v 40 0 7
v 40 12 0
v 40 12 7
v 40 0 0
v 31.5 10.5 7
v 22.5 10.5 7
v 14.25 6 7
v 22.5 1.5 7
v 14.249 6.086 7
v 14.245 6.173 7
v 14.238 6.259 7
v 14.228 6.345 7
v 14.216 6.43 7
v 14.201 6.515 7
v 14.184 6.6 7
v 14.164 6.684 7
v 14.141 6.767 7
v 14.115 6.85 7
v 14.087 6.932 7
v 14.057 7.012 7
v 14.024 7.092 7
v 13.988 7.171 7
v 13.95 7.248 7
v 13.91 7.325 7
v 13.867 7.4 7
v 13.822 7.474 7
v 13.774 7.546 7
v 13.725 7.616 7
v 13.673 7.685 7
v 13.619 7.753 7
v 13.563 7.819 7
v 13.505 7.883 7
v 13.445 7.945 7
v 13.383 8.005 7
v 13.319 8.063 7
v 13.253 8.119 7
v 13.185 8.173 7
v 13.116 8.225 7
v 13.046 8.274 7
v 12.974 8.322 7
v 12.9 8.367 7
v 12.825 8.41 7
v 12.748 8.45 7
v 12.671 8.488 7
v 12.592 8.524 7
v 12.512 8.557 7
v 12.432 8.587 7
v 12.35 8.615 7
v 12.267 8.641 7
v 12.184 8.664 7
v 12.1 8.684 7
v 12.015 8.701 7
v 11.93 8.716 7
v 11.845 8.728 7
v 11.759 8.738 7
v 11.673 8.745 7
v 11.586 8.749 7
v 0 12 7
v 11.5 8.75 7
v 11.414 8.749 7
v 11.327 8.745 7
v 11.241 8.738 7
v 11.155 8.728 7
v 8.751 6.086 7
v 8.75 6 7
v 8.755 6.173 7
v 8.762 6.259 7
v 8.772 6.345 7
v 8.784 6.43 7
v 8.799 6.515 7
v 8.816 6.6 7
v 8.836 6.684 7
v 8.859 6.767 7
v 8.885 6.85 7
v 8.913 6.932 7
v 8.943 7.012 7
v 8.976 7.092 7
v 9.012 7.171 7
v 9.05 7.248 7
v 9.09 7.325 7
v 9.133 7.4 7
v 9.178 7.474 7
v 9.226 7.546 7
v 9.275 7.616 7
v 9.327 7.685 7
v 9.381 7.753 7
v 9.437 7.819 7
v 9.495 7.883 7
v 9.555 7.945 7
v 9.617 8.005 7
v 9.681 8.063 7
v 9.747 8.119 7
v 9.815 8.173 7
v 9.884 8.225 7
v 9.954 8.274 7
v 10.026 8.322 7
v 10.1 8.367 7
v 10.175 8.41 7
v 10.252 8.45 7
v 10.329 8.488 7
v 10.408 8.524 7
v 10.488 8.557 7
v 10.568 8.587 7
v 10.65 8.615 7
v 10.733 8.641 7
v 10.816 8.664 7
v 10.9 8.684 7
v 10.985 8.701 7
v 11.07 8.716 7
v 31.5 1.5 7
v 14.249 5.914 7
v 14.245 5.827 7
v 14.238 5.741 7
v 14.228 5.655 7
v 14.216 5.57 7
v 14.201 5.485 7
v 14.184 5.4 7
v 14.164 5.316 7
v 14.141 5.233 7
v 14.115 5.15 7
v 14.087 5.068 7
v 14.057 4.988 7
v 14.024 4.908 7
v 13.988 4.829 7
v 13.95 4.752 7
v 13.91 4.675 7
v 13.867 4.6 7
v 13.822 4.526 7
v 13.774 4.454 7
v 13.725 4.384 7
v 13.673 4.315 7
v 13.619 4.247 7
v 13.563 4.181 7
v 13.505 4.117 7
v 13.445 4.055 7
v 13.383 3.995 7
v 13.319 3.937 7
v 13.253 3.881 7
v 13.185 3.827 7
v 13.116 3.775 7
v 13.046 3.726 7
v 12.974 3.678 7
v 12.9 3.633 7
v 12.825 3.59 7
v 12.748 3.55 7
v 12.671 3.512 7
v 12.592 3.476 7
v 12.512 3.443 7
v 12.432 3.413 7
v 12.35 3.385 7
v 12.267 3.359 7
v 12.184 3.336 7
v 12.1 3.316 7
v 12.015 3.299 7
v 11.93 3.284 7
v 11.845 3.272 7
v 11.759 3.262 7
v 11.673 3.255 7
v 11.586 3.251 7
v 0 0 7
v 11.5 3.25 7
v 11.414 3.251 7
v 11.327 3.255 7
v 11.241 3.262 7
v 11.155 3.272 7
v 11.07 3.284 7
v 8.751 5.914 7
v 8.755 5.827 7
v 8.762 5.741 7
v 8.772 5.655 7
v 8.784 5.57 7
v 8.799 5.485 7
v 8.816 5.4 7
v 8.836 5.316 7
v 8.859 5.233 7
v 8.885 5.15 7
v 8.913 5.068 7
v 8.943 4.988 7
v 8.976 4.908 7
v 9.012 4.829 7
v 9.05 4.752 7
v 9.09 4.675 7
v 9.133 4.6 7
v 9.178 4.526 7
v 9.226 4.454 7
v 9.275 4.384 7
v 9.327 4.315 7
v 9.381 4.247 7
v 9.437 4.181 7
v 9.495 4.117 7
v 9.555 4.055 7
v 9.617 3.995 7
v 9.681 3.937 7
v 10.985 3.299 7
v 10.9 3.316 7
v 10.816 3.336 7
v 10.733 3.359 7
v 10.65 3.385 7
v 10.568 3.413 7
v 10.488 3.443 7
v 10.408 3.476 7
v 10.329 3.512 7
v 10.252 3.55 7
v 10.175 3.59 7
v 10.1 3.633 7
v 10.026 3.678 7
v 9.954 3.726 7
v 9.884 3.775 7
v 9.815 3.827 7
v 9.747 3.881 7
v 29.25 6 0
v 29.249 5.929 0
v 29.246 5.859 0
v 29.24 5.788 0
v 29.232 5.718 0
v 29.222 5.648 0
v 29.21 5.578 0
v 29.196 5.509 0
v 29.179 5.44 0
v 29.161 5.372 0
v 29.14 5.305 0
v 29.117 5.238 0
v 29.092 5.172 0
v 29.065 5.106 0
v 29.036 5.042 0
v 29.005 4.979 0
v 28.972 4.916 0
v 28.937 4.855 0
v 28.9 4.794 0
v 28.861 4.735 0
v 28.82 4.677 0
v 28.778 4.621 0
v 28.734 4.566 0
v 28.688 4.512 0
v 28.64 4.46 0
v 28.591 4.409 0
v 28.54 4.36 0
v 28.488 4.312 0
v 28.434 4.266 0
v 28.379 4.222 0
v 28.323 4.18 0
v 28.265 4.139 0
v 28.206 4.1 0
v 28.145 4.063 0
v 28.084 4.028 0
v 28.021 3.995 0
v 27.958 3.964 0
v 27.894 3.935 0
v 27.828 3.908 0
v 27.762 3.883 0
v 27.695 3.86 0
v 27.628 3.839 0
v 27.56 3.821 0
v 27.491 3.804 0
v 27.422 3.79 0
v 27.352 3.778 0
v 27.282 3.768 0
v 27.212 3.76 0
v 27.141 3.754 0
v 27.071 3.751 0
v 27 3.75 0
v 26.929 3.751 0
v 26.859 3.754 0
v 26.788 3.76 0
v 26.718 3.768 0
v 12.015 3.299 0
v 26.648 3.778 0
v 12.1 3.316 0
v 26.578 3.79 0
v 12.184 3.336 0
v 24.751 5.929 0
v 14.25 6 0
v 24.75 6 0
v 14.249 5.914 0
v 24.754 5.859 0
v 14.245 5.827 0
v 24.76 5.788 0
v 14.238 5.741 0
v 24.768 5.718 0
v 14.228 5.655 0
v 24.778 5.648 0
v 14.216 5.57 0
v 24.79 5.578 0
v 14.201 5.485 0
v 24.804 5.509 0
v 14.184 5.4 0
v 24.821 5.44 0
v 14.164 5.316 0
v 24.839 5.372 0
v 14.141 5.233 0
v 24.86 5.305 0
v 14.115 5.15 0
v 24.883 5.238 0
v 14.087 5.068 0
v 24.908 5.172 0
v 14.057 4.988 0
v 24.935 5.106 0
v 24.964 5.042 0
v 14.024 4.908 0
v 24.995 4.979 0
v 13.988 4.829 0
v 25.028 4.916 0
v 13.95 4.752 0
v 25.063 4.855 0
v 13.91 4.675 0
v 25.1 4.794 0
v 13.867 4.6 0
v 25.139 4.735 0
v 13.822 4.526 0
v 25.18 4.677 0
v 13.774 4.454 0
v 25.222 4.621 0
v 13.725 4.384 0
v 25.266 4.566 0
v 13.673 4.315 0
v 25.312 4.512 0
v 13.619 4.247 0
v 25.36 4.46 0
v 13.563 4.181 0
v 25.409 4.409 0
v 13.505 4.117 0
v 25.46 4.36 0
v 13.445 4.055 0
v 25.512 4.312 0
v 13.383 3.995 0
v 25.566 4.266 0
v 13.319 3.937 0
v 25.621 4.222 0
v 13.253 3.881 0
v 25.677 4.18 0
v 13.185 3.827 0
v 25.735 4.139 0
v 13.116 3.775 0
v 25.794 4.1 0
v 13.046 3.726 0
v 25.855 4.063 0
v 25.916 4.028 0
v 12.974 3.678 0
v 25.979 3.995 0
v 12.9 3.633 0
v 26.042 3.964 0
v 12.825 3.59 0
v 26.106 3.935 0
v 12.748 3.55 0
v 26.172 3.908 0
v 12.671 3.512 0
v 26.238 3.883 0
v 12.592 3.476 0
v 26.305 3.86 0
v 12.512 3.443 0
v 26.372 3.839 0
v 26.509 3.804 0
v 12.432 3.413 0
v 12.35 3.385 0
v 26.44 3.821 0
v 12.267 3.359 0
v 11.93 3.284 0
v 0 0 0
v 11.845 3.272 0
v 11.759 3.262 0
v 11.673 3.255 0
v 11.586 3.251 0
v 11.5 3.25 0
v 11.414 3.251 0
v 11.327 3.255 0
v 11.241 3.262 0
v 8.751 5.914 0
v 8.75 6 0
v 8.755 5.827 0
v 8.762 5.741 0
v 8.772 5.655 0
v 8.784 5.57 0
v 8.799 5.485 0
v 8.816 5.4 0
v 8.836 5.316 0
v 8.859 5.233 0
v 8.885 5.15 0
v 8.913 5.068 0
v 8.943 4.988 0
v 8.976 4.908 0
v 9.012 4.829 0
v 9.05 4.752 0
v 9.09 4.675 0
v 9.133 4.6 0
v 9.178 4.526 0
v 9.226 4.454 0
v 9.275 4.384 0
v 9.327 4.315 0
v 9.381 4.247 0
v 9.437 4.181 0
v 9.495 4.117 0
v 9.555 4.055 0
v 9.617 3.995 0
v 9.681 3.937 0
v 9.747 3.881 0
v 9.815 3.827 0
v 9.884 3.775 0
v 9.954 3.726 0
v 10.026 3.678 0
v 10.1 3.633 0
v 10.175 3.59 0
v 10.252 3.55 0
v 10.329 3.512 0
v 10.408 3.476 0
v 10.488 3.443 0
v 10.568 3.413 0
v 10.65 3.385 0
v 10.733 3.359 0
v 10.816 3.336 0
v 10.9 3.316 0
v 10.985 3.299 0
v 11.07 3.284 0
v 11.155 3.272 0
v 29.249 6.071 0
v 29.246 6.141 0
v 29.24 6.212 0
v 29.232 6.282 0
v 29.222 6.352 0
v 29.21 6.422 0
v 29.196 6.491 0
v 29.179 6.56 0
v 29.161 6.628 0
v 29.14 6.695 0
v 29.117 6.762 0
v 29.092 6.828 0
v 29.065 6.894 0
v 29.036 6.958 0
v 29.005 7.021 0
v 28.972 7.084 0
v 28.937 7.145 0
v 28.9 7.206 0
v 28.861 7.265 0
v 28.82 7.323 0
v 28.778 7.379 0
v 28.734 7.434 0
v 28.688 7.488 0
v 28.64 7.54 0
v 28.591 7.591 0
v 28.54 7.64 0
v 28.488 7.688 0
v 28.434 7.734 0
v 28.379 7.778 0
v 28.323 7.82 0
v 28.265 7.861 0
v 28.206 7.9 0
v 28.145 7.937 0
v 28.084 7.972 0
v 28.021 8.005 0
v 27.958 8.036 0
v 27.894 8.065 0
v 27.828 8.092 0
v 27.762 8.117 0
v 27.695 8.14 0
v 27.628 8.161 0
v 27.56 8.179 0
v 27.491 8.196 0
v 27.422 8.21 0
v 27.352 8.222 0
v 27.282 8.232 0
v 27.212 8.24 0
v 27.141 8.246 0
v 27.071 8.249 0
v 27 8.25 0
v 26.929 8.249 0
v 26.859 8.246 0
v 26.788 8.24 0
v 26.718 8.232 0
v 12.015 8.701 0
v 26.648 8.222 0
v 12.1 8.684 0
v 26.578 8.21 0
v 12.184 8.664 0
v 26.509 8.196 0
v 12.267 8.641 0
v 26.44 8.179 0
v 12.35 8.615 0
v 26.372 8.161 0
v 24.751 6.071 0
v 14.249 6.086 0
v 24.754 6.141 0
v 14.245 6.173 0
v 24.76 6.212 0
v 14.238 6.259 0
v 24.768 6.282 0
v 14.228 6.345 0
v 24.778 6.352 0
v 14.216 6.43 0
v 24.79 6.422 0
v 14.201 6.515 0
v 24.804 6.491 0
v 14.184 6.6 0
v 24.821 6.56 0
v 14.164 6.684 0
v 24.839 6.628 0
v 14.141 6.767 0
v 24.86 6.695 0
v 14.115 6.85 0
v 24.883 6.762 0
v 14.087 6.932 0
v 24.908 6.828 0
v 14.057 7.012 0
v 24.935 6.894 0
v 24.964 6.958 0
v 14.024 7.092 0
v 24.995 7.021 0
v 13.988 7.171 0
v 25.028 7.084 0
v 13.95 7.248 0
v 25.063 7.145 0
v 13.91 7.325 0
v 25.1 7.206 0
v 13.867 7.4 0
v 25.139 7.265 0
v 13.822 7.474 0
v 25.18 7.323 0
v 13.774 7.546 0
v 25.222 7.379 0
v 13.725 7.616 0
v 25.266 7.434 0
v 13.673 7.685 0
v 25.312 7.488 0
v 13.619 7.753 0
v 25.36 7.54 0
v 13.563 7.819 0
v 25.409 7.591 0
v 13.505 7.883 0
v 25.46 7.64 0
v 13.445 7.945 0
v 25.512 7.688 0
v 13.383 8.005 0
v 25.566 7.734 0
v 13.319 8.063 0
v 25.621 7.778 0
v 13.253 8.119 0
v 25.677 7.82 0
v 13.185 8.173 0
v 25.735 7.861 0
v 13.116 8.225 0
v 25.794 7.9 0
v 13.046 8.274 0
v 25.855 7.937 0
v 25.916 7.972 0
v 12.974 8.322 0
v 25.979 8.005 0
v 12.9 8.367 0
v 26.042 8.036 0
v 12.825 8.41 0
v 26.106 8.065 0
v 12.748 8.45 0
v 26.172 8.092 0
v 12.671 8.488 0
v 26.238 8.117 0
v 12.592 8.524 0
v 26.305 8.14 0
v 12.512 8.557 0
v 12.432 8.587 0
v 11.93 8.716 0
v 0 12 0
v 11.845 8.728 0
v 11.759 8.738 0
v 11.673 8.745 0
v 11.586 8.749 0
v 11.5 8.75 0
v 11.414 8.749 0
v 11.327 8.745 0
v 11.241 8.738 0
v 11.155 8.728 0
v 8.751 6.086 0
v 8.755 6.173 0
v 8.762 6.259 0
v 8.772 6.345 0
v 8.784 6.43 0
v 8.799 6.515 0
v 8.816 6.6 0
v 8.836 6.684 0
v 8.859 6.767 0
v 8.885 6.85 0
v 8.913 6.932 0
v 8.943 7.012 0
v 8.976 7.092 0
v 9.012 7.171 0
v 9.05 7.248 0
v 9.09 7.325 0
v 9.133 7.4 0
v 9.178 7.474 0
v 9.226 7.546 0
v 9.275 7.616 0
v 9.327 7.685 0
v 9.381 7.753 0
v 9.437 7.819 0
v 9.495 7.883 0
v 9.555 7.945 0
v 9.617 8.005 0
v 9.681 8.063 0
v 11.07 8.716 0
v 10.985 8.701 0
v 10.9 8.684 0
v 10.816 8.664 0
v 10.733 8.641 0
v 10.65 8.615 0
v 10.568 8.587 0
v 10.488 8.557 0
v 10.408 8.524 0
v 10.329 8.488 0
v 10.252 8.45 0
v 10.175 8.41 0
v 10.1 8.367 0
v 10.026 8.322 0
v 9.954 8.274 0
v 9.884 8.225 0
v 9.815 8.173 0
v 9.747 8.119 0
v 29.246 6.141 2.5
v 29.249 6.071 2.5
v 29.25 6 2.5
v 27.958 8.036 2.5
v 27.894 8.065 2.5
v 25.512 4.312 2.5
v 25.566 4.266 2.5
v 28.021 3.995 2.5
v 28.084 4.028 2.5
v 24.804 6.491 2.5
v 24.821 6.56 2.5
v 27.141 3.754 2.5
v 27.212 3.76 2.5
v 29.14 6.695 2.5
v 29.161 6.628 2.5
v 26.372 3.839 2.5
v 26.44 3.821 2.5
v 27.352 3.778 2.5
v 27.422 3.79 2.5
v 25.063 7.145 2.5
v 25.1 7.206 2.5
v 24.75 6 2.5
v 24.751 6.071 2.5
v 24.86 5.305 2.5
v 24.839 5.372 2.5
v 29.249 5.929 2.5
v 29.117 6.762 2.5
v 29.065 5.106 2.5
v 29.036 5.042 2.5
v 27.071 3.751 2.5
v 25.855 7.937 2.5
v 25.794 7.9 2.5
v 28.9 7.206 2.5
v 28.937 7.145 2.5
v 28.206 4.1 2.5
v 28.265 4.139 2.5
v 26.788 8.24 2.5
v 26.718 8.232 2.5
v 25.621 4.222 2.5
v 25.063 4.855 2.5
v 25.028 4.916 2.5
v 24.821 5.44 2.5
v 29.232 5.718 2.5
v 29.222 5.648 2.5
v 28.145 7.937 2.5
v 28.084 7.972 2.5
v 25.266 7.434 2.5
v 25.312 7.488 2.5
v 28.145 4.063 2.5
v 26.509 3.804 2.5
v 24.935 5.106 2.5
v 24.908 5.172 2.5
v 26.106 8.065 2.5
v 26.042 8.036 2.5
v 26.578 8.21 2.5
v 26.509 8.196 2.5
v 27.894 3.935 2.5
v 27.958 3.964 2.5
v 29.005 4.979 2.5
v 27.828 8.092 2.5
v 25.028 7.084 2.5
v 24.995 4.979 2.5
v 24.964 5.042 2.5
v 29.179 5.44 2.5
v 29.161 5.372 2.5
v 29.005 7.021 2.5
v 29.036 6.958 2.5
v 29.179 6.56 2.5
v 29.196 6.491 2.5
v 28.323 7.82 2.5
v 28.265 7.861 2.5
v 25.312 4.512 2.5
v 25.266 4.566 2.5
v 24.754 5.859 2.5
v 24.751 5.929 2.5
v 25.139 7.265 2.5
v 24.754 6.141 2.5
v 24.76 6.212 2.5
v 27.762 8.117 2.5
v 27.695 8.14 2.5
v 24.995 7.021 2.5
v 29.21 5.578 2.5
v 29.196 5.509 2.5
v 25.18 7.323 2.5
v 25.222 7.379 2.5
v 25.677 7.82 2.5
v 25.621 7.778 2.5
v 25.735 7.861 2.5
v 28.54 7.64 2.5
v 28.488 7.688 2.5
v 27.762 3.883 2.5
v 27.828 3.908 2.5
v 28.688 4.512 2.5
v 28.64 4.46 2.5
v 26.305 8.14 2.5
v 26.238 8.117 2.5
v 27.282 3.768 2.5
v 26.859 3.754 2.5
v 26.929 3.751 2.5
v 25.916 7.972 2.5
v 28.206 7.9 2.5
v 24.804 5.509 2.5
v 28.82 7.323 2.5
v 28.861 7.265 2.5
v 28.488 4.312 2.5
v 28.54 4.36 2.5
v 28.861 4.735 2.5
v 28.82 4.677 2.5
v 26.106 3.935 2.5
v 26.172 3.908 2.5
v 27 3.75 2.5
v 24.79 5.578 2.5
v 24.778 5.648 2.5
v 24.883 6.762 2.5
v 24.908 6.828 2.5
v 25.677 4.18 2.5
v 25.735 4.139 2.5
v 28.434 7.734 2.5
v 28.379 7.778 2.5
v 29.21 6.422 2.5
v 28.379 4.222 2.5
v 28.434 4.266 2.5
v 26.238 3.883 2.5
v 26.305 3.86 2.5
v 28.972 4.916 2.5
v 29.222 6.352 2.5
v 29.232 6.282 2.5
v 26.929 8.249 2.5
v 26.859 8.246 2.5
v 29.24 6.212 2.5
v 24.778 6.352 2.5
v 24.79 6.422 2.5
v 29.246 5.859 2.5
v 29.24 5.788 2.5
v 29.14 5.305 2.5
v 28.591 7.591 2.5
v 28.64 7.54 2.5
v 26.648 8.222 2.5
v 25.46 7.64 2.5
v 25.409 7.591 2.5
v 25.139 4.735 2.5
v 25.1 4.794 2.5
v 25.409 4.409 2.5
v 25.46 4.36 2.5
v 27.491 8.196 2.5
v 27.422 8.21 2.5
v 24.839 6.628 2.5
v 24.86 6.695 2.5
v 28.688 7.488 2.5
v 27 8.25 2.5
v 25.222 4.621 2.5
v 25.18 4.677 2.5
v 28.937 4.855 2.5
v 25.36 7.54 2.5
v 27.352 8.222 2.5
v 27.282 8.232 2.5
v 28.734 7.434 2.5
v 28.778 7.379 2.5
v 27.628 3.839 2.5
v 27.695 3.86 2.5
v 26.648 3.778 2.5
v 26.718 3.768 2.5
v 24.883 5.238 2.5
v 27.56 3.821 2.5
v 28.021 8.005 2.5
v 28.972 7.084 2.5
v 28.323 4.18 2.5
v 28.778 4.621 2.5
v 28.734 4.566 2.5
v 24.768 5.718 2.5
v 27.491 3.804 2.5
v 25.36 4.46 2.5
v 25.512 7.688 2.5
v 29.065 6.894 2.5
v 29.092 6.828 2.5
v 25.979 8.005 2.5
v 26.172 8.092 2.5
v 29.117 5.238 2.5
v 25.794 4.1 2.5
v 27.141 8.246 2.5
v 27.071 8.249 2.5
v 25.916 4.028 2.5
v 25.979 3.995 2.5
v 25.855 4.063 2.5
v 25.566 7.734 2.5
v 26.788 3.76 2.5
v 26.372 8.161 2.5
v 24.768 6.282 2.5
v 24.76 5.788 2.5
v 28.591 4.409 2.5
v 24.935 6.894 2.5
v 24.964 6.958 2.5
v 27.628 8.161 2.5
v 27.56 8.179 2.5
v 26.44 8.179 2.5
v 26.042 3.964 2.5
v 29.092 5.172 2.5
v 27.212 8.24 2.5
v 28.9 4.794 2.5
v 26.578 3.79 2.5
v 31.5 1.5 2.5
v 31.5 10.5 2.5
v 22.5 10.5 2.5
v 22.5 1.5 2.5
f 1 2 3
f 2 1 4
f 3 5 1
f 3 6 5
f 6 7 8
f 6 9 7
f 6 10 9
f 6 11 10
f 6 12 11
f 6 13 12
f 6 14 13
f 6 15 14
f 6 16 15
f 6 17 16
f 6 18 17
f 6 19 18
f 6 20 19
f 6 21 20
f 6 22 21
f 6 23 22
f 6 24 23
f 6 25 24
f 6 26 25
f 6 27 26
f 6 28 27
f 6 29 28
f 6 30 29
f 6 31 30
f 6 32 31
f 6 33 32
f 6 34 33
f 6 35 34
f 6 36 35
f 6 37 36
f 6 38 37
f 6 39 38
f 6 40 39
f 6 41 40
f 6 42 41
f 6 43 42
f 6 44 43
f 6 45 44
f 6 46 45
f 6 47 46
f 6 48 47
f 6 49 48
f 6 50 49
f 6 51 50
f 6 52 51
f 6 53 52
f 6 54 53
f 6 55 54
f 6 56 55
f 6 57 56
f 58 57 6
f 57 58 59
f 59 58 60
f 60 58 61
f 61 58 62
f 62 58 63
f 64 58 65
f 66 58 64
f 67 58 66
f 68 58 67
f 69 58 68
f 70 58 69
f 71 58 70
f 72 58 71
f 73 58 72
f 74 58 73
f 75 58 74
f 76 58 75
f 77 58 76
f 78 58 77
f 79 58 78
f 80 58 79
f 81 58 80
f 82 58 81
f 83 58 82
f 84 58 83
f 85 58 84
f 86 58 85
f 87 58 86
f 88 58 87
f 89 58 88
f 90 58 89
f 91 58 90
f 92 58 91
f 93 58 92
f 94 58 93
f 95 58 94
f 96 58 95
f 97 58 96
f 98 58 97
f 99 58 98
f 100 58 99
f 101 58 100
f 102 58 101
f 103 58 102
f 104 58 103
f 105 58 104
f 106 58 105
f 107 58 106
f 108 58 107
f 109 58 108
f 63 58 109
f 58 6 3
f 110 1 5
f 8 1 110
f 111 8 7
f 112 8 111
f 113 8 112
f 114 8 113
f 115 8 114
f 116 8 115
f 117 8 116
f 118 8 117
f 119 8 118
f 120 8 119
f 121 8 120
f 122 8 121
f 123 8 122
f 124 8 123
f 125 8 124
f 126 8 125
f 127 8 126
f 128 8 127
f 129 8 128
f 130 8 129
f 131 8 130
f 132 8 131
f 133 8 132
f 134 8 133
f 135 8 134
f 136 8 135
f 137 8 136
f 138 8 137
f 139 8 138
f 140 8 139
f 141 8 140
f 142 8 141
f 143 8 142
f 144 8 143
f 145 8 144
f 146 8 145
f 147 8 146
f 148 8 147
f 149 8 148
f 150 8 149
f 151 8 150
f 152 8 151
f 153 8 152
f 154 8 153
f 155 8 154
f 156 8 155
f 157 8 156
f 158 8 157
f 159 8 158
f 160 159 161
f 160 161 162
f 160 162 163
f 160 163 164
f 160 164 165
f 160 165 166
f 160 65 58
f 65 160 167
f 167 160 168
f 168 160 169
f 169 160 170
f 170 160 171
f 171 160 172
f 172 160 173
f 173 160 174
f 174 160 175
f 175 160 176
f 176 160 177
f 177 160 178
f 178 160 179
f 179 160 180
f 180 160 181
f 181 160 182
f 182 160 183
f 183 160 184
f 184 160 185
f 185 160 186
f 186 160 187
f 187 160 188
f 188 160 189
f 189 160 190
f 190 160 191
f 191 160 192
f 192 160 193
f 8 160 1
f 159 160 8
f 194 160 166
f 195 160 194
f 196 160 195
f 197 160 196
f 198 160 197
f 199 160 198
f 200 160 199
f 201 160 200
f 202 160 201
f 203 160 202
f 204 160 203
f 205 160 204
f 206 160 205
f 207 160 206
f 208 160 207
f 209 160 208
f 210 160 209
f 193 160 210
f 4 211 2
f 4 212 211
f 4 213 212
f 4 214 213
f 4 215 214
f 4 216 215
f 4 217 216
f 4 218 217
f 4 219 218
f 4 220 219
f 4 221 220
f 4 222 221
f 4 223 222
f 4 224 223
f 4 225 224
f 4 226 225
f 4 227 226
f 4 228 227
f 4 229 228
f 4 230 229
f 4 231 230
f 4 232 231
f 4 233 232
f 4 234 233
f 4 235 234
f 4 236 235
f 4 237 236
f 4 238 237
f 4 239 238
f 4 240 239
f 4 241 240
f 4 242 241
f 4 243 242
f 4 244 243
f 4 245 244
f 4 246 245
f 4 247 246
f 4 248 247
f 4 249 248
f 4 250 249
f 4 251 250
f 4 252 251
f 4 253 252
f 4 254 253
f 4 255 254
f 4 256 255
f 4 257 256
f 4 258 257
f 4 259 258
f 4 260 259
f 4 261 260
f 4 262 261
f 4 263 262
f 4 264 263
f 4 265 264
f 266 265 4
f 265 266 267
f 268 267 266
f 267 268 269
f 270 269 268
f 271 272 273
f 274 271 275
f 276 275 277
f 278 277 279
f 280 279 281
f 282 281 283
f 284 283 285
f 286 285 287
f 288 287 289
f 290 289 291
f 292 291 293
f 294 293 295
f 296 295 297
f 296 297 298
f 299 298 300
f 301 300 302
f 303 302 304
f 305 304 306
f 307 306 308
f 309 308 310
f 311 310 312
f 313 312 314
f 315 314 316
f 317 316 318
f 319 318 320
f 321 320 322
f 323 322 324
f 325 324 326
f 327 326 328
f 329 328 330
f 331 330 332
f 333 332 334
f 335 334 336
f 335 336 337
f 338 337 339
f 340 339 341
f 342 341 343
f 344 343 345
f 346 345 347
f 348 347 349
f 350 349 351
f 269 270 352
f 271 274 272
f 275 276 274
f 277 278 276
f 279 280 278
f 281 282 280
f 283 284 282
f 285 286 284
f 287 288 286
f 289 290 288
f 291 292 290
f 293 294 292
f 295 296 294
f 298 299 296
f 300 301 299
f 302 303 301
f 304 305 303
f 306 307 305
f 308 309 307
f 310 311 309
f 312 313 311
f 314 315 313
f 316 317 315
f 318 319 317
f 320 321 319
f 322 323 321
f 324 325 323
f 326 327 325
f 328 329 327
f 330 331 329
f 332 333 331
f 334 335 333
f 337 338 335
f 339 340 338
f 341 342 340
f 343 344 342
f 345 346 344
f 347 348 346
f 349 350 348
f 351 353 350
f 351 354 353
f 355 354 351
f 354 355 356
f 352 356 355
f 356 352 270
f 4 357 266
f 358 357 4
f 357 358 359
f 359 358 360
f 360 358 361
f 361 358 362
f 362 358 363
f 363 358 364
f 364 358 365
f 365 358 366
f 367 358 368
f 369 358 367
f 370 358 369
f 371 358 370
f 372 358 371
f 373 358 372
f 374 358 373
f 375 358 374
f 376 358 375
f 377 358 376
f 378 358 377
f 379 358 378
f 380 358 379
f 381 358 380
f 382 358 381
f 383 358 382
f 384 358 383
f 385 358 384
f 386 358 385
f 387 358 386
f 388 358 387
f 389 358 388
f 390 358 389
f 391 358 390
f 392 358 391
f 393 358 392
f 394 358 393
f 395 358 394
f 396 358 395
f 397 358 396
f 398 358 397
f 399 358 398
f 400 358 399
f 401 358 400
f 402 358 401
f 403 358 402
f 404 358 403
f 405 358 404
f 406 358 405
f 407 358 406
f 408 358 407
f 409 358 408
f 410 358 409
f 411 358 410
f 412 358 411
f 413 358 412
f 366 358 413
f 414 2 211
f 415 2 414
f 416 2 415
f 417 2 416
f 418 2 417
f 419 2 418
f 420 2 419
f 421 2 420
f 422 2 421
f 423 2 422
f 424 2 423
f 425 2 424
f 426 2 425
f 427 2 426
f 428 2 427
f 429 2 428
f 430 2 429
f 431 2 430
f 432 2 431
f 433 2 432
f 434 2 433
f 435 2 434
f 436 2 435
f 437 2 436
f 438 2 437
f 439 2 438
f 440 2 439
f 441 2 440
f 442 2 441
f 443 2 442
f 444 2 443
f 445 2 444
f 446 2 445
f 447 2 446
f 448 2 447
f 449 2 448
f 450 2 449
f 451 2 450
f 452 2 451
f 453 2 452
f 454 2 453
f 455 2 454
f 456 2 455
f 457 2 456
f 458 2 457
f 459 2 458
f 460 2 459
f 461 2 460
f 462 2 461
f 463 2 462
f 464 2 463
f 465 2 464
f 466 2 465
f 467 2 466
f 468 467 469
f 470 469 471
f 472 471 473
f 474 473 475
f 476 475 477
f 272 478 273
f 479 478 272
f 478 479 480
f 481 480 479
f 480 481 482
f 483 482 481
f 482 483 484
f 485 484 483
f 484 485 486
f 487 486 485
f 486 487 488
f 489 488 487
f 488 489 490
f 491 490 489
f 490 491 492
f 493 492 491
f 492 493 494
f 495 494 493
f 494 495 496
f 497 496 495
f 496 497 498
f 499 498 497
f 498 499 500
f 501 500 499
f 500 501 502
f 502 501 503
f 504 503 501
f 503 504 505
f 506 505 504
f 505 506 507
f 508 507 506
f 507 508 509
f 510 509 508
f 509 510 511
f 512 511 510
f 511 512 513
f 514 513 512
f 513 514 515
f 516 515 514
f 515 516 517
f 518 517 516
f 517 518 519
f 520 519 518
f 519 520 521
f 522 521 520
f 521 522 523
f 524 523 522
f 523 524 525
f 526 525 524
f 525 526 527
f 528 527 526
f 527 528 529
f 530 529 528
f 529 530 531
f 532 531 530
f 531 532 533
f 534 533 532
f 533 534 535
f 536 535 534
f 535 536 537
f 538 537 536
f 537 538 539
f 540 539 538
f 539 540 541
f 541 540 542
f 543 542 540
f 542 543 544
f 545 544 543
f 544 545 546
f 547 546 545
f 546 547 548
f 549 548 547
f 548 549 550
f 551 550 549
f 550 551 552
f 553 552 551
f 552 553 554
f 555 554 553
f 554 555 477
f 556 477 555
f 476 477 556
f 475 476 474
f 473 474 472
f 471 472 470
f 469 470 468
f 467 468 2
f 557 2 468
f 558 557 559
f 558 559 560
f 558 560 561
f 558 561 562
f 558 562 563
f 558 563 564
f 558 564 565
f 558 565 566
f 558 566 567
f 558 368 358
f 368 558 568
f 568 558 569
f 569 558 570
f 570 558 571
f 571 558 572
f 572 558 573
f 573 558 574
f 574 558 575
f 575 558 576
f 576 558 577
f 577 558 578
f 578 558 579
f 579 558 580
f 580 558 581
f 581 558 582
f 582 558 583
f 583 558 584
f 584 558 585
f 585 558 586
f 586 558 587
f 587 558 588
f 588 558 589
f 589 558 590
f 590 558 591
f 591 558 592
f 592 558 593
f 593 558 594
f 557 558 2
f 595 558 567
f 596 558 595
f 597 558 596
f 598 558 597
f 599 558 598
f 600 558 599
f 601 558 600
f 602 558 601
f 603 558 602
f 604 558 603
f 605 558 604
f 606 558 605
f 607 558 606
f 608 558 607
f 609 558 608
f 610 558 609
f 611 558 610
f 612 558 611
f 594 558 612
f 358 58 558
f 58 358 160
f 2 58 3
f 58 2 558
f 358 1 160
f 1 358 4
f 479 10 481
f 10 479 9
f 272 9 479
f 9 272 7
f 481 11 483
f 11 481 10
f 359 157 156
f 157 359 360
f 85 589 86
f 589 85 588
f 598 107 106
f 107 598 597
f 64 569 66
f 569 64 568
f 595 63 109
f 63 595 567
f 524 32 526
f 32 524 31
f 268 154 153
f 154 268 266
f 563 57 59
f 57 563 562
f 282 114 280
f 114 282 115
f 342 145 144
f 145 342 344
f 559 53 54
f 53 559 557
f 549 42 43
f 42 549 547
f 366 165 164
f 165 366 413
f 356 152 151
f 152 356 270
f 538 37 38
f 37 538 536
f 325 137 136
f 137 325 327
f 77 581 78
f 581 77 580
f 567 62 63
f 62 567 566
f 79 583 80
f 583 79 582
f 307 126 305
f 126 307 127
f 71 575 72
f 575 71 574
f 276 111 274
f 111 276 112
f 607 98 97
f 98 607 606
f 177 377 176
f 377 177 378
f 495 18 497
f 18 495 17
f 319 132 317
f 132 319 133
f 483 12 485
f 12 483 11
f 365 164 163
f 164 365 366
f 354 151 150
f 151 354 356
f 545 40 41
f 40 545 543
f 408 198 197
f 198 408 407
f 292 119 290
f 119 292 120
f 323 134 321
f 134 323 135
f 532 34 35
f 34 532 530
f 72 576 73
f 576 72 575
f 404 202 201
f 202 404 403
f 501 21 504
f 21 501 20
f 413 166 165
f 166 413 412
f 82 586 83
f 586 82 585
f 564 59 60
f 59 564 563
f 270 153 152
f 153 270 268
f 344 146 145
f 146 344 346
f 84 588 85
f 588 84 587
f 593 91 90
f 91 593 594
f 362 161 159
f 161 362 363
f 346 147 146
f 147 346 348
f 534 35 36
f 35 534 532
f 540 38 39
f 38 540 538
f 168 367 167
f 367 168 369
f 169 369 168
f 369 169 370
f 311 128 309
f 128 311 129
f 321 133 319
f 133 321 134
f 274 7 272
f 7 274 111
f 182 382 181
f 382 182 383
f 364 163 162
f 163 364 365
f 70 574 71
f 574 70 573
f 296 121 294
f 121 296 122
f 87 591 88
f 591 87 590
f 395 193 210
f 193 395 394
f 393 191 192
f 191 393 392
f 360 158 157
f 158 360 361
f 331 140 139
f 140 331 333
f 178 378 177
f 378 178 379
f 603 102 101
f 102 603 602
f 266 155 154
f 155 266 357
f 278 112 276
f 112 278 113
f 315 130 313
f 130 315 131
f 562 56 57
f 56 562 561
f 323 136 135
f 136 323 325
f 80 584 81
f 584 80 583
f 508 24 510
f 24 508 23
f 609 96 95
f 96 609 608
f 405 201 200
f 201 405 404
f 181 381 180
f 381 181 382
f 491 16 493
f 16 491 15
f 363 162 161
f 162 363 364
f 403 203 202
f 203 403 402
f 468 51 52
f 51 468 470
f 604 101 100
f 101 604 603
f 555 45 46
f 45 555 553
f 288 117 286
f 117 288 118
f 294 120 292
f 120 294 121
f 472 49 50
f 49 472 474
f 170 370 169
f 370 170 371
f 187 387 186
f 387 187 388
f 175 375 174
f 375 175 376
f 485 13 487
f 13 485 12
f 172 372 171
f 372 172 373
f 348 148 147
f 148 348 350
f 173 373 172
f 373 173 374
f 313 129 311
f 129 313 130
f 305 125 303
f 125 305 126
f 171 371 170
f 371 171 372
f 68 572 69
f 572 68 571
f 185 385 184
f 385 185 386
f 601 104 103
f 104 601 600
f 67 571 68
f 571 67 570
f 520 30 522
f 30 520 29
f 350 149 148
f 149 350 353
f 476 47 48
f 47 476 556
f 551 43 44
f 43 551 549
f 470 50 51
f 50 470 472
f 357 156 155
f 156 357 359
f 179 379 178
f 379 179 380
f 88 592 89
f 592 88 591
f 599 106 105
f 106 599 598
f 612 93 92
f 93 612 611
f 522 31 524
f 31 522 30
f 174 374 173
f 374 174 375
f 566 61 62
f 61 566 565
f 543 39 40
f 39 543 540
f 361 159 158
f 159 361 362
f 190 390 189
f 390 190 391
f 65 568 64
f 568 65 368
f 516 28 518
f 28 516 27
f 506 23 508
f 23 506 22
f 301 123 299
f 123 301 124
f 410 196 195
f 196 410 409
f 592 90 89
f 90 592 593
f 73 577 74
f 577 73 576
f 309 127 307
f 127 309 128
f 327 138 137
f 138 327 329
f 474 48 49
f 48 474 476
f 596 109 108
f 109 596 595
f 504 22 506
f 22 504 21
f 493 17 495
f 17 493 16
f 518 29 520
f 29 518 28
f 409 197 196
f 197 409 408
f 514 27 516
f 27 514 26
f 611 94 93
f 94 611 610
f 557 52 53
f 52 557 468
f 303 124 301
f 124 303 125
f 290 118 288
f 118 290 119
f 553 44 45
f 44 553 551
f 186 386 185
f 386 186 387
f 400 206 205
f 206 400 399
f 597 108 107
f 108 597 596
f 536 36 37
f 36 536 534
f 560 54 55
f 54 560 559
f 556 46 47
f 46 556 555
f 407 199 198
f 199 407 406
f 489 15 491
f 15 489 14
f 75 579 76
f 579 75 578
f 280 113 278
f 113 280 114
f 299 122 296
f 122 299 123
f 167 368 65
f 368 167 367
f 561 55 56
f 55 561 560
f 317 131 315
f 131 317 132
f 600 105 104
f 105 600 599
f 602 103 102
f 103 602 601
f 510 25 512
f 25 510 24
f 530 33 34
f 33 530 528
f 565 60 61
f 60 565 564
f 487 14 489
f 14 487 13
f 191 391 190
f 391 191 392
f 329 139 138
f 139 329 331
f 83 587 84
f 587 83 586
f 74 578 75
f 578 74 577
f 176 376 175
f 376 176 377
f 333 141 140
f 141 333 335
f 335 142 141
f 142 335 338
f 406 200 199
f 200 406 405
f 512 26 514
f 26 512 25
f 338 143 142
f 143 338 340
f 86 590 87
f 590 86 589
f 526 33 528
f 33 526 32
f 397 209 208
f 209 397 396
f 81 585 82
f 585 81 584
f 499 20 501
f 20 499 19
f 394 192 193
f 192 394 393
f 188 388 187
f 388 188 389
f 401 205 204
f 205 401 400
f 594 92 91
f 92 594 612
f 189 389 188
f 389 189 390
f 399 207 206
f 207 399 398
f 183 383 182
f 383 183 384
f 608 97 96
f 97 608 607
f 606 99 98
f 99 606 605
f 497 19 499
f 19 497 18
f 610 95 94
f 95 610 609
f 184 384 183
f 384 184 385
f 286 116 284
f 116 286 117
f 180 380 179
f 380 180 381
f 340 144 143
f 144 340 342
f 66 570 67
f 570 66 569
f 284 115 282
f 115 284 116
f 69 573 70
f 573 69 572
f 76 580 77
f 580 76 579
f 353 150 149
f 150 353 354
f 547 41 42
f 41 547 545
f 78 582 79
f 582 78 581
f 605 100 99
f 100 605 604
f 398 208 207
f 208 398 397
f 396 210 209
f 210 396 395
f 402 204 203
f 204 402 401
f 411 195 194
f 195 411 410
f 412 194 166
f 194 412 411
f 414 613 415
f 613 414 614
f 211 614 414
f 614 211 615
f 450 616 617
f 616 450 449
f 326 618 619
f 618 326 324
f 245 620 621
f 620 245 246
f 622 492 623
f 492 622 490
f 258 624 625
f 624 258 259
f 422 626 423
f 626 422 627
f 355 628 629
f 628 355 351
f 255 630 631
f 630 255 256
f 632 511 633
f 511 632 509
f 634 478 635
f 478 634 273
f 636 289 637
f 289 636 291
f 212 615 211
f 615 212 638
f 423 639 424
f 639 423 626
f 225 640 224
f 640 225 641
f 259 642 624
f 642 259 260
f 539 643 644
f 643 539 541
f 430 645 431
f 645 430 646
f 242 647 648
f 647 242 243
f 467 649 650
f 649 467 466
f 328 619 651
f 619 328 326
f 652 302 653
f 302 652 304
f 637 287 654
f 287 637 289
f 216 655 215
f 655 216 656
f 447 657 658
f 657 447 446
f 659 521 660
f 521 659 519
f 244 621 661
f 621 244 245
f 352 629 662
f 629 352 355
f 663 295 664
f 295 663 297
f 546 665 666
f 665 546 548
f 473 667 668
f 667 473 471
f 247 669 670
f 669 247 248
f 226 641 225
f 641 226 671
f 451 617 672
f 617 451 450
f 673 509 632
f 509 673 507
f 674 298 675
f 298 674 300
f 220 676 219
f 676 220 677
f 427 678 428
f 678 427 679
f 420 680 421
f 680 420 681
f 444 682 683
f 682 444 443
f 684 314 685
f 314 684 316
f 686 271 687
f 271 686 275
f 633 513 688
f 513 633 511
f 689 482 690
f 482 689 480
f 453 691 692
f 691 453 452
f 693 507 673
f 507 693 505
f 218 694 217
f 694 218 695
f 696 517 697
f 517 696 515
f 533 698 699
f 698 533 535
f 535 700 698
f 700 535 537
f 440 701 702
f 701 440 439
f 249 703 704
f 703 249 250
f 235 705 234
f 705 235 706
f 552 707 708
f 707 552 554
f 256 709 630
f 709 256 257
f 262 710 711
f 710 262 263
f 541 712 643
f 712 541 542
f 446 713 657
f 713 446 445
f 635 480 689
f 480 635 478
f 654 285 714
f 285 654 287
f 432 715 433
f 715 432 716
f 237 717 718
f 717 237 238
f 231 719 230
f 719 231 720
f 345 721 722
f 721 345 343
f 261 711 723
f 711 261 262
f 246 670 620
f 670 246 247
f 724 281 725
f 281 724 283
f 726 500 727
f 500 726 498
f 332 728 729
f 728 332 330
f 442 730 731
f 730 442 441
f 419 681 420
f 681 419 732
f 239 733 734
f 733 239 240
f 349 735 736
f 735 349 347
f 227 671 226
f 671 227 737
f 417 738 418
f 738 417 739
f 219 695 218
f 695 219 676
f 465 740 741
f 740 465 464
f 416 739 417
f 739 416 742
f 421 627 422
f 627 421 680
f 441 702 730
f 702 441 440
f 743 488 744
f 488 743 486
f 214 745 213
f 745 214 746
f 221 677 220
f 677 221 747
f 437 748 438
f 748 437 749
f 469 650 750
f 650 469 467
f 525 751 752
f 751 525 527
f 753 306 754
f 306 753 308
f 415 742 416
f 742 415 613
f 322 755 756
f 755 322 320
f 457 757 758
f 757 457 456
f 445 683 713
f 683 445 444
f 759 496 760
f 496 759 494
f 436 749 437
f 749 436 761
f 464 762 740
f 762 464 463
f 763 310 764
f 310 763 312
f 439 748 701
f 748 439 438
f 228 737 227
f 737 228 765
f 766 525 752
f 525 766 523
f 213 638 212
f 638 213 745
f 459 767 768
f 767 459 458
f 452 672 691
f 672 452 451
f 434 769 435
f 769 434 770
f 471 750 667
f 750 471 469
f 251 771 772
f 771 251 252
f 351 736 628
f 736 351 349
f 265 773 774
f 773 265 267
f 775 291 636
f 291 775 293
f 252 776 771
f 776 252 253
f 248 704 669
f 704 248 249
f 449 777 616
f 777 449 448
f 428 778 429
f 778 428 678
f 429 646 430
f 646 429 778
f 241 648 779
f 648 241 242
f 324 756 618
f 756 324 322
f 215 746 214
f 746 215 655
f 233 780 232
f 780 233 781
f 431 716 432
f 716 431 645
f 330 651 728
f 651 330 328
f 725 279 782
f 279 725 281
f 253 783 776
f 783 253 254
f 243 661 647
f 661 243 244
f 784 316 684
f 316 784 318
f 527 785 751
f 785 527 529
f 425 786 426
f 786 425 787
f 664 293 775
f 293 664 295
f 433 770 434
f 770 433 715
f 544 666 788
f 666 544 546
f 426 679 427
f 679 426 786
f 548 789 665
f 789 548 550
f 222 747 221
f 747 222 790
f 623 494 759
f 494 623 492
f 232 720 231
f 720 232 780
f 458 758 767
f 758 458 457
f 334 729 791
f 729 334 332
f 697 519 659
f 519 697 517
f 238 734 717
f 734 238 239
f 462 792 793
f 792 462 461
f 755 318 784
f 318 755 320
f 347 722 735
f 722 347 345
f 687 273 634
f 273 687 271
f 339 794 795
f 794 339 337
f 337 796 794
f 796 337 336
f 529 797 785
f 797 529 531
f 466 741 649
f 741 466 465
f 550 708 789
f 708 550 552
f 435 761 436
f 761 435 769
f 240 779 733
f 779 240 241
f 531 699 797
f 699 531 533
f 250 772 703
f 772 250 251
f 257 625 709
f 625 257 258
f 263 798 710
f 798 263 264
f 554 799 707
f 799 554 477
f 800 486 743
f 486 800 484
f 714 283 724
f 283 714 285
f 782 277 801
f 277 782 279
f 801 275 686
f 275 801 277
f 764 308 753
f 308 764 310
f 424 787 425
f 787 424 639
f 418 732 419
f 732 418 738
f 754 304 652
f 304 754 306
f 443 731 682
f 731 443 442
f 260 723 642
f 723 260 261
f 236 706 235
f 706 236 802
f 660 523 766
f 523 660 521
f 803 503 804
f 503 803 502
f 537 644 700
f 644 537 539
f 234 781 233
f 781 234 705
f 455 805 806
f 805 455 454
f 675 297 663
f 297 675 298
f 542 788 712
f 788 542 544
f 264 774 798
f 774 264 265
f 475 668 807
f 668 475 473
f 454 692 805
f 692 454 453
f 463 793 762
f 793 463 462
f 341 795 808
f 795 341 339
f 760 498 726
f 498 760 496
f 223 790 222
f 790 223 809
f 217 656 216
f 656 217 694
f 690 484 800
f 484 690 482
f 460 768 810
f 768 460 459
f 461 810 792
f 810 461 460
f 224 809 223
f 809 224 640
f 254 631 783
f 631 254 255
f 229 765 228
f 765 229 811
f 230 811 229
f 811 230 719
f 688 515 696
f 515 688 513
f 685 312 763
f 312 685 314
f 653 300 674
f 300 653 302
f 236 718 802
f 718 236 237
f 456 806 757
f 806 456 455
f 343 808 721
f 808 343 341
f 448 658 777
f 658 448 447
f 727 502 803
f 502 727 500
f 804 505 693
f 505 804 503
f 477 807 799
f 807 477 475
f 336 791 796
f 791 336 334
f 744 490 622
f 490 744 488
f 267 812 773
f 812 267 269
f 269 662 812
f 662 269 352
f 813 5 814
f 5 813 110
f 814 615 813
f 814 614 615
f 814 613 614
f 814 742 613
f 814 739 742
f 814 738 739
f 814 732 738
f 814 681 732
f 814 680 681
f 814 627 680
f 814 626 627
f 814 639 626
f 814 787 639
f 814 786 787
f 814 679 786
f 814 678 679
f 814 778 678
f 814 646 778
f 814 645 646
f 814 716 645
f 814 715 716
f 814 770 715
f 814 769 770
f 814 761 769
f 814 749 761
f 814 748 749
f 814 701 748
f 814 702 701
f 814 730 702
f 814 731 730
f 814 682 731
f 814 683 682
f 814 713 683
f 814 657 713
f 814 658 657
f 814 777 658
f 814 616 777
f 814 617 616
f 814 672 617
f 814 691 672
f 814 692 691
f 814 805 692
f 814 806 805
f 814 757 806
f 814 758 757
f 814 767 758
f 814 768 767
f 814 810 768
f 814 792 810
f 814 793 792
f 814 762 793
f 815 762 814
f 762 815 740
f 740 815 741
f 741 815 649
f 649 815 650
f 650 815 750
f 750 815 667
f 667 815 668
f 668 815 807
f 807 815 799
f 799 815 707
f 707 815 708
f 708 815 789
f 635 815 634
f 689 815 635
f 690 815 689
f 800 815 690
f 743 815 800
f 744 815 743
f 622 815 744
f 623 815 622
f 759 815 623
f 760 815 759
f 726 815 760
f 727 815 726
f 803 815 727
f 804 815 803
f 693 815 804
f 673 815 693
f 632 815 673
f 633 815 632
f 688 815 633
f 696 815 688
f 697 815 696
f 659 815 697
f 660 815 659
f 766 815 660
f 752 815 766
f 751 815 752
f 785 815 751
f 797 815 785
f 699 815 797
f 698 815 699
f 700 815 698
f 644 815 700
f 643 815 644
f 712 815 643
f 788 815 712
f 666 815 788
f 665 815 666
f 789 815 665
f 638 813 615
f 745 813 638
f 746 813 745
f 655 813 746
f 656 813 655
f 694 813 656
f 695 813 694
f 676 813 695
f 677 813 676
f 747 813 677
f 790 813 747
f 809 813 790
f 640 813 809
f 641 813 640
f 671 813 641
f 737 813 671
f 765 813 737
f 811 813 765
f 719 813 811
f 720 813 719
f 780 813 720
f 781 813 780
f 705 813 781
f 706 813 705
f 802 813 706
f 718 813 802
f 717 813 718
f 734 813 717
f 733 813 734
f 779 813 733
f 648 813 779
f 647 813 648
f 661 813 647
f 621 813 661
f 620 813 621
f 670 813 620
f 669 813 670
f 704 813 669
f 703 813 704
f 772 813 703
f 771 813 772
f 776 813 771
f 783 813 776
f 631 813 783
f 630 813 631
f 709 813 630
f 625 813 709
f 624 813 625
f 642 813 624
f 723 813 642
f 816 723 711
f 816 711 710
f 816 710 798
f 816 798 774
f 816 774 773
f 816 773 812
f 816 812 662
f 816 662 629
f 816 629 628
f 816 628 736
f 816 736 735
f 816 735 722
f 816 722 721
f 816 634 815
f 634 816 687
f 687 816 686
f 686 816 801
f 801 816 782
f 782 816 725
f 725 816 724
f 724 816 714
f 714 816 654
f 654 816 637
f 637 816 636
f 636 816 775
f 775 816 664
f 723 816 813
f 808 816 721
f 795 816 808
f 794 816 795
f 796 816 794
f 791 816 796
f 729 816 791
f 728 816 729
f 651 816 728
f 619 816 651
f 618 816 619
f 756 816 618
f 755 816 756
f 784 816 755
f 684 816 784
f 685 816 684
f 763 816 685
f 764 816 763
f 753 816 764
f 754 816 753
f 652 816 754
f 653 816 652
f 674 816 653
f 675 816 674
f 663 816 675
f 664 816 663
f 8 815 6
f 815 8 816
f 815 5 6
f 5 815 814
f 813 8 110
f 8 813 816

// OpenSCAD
$fn=200;

// baseBlock

difference()
{
    cube([40,12,7]);
    translate([11.5,6,-1])
    {
        cylinder(d=5.5,h=9);      
    }
    translate([27,6,-1])
    {
        cylinder(d=4.5,h=9);
    }
    translate([22.5,1.5,2.5])
    {
        cube([9,9,6]);        
    }
}
